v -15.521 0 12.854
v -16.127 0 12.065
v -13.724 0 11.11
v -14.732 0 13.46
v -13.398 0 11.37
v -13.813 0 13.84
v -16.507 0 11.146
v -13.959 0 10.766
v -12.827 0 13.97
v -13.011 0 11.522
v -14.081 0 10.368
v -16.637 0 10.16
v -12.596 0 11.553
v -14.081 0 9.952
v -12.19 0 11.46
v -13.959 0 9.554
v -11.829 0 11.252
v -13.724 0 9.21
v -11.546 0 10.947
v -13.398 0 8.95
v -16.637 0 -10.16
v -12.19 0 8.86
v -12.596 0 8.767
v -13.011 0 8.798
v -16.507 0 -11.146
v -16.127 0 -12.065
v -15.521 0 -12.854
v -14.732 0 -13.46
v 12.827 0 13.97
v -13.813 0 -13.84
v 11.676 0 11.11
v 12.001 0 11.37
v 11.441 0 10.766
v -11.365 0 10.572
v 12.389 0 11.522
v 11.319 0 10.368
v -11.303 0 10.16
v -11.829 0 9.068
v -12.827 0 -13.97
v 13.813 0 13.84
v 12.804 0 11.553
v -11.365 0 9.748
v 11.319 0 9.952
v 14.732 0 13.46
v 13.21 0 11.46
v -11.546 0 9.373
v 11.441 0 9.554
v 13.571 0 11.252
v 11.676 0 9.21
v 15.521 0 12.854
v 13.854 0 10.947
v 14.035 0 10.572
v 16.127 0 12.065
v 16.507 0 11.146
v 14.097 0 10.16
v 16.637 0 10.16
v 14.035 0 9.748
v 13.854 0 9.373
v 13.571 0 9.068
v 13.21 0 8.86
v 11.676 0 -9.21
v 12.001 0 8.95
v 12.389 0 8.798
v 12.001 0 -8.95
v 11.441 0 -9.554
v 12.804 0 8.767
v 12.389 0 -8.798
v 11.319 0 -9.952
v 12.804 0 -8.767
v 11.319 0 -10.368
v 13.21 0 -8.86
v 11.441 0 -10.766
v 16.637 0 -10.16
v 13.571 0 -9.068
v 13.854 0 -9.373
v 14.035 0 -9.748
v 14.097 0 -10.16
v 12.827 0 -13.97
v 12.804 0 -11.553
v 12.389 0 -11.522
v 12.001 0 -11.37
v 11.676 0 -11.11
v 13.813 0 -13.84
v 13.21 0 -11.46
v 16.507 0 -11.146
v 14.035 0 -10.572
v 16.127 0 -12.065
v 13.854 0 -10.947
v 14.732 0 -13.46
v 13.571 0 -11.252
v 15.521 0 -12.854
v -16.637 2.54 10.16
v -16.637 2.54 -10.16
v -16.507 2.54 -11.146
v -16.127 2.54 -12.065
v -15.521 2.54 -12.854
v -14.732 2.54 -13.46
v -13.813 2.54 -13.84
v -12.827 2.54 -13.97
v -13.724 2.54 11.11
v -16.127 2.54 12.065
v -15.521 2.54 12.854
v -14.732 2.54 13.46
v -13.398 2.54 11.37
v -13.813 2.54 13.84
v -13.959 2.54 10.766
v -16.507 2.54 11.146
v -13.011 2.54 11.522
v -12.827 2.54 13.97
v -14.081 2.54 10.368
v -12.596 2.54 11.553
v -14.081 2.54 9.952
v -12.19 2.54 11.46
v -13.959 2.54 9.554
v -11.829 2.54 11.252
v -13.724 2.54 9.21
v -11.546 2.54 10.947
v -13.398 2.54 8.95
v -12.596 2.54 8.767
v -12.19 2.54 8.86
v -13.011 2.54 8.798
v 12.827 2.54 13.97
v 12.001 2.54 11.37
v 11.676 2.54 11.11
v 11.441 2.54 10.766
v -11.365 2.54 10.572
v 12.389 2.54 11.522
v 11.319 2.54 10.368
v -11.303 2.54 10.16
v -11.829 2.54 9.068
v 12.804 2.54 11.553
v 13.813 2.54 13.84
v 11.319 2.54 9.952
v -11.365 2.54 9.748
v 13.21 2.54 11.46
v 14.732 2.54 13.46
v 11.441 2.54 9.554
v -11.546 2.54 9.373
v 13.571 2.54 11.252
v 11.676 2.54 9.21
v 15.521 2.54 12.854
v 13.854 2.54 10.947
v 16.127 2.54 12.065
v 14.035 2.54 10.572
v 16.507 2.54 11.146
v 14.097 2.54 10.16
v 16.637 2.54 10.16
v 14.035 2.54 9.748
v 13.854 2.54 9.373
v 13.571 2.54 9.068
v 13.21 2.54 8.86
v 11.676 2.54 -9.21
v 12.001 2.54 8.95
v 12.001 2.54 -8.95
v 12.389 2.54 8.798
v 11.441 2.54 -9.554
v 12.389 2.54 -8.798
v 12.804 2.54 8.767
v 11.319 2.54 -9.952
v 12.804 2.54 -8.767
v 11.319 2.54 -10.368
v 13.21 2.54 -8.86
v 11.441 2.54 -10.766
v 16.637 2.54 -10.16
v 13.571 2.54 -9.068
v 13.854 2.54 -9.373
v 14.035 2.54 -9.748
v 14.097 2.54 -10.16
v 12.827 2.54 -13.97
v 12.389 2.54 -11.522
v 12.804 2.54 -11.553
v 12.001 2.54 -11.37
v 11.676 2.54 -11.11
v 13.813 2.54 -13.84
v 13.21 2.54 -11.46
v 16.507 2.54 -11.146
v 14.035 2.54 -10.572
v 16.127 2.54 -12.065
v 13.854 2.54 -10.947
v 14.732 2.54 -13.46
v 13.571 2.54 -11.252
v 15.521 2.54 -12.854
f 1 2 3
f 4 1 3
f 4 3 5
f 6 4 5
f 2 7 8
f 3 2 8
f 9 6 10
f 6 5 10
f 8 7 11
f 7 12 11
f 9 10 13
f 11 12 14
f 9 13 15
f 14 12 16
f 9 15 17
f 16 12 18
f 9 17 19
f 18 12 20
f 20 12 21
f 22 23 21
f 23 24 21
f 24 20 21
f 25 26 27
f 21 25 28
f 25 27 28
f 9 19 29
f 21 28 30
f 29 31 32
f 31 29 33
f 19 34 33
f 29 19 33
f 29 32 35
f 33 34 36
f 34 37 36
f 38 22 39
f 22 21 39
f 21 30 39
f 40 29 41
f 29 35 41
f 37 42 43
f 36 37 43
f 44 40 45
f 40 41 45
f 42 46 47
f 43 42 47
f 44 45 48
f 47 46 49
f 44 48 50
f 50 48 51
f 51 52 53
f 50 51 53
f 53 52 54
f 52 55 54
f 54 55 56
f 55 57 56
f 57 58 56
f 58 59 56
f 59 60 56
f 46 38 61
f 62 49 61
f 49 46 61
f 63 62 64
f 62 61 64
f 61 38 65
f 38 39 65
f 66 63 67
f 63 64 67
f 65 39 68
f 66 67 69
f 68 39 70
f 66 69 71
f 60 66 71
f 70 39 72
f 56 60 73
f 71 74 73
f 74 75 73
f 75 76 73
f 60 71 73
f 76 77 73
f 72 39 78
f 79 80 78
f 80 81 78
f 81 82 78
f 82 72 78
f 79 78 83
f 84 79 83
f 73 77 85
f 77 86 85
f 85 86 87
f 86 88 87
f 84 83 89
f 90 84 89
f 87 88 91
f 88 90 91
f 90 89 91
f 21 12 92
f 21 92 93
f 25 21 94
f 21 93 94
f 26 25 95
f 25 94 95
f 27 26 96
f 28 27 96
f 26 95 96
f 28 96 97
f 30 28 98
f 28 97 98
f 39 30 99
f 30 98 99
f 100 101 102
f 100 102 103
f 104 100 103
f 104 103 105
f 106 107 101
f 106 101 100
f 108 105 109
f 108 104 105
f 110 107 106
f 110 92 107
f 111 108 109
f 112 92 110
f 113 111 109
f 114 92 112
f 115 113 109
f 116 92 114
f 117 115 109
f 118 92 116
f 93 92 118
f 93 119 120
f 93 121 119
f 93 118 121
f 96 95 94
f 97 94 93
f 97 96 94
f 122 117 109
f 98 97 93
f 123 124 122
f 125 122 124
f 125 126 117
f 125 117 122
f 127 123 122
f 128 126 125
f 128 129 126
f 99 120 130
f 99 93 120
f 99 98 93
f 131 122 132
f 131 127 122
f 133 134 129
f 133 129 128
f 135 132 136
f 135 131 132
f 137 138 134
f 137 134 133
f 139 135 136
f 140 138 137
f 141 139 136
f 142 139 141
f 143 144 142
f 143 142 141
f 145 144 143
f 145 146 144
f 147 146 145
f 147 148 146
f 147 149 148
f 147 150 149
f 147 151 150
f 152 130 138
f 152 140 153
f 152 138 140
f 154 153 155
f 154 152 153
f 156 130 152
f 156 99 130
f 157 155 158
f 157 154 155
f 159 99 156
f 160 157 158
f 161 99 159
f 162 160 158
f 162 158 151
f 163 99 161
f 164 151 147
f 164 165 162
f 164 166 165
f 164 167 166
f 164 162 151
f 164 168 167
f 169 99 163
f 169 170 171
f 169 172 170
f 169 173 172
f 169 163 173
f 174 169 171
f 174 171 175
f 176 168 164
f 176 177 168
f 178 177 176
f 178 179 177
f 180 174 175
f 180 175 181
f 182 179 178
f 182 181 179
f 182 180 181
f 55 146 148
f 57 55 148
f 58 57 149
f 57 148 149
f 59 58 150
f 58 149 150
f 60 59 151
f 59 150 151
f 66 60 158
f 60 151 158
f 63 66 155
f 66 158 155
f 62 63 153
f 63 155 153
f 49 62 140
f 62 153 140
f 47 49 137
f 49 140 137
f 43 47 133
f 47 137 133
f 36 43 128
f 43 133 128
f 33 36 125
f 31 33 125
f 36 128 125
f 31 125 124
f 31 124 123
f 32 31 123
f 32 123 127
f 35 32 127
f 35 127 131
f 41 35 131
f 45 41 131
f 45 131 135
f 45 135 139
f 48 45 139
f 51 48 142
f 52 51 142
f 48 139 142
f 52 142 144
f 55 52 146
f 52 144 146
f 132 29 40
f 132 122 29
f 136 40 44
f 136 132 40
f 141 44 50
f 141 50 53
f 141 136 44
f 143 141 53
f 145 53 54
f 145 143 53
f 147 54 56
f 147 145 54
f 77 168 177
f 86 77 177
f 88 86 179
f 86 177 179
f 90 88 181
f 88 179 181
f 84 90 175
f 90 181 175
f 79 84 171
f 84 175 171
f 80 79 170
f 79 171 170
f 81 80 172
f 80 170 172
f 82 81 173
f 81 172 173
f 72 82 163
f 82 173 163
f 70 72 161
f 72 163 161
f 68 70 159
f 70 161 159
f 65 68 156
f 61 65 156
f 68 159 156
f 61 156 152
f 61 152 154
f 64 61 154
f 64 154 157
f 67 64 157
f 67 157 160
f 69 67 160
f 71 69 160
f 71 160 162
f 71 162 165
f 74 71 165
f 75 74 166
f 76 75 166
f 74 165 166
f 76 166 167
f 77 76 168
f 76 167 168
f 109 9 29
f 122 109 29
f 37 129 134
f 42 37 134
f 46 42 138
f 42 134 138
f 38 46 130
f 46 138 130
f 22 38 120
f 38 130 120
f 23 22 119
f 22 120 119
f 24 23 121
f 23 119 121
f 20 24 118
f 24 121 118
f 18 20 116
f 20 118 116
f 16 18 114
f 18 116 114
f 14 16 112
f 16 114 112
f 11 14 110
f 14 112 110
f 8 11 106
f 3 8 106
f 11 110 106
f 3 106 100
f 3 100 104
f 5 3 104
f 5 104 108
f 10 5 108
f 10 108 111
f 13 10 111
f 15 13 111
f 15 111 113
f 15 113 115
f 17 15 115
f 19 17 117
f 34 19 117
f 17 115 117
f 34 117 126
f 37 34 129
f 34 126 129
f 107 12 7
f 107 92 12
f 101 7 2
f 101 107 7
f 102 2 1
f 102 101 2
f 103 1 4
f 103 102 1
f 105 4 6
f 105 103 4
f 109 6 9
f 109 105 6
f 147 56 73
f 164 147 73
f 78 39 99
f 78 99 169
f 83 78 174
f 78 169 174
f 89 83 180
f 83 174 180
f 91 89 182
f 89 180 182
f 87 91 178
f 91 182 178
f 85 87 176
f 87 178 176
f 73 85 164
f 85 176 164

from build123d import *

# Parameters (mm, degrees)
SKETCH1_W           = 33.274
SKETCH1_H           = 27.94
BOSS_EXTRUDE1_DEPTH = 2.54
SKETCH2_R           = 1.397
CUT_EXTRUDE1_DEPTH  = 2.54
FILLET1_R           = 3.81


with BuildPart() as part:
    # Sketch1 → Boss-Extrude1 (new body)
    with BuildSketch(Plane(origin=(0, 0, 0), x_dir=(1, 0, 0), z_dir=(0, 1, 0))):
        Rectangle(SKETCH1_W, SKETCH1_H)
    extrude(amount=BOSS_EXTRUDE1_DEPTH)

    # Sketch2 → Cut-Extrude1 (cut)
    with BuildSketch(Plane(origin=(0, 2.54, 0), x_dir=(1, 0, 0), z_dir=(0, 1, 0))):
        with Locations((12.7, -10.16)):
            Circle(SKETCH2_R)
        with Locations((-12.7, -10.16)):
            Circle(SKETCH2_R)
        with Locations((12.7, 10.16)):
            Circle(SKETCH2_R)
    extrude(amount=-CUT_EXTRUDE1_DEPTH, mode=Mode.SUBTRACT)

    # Fillet1
    fillet1_edges = [part.edges().sort_by_distance(p)[0] for p in [
        (16.637, 1.27, 13.97),
        (-16.637, 1.27, 13.97),
        (-16.637, 1.27, -13.97),
        (16.637, 1.27, -13.97),
    ]]
    fillet(fillet1_edges, radius=FILLET1_R)


solid = part.part
